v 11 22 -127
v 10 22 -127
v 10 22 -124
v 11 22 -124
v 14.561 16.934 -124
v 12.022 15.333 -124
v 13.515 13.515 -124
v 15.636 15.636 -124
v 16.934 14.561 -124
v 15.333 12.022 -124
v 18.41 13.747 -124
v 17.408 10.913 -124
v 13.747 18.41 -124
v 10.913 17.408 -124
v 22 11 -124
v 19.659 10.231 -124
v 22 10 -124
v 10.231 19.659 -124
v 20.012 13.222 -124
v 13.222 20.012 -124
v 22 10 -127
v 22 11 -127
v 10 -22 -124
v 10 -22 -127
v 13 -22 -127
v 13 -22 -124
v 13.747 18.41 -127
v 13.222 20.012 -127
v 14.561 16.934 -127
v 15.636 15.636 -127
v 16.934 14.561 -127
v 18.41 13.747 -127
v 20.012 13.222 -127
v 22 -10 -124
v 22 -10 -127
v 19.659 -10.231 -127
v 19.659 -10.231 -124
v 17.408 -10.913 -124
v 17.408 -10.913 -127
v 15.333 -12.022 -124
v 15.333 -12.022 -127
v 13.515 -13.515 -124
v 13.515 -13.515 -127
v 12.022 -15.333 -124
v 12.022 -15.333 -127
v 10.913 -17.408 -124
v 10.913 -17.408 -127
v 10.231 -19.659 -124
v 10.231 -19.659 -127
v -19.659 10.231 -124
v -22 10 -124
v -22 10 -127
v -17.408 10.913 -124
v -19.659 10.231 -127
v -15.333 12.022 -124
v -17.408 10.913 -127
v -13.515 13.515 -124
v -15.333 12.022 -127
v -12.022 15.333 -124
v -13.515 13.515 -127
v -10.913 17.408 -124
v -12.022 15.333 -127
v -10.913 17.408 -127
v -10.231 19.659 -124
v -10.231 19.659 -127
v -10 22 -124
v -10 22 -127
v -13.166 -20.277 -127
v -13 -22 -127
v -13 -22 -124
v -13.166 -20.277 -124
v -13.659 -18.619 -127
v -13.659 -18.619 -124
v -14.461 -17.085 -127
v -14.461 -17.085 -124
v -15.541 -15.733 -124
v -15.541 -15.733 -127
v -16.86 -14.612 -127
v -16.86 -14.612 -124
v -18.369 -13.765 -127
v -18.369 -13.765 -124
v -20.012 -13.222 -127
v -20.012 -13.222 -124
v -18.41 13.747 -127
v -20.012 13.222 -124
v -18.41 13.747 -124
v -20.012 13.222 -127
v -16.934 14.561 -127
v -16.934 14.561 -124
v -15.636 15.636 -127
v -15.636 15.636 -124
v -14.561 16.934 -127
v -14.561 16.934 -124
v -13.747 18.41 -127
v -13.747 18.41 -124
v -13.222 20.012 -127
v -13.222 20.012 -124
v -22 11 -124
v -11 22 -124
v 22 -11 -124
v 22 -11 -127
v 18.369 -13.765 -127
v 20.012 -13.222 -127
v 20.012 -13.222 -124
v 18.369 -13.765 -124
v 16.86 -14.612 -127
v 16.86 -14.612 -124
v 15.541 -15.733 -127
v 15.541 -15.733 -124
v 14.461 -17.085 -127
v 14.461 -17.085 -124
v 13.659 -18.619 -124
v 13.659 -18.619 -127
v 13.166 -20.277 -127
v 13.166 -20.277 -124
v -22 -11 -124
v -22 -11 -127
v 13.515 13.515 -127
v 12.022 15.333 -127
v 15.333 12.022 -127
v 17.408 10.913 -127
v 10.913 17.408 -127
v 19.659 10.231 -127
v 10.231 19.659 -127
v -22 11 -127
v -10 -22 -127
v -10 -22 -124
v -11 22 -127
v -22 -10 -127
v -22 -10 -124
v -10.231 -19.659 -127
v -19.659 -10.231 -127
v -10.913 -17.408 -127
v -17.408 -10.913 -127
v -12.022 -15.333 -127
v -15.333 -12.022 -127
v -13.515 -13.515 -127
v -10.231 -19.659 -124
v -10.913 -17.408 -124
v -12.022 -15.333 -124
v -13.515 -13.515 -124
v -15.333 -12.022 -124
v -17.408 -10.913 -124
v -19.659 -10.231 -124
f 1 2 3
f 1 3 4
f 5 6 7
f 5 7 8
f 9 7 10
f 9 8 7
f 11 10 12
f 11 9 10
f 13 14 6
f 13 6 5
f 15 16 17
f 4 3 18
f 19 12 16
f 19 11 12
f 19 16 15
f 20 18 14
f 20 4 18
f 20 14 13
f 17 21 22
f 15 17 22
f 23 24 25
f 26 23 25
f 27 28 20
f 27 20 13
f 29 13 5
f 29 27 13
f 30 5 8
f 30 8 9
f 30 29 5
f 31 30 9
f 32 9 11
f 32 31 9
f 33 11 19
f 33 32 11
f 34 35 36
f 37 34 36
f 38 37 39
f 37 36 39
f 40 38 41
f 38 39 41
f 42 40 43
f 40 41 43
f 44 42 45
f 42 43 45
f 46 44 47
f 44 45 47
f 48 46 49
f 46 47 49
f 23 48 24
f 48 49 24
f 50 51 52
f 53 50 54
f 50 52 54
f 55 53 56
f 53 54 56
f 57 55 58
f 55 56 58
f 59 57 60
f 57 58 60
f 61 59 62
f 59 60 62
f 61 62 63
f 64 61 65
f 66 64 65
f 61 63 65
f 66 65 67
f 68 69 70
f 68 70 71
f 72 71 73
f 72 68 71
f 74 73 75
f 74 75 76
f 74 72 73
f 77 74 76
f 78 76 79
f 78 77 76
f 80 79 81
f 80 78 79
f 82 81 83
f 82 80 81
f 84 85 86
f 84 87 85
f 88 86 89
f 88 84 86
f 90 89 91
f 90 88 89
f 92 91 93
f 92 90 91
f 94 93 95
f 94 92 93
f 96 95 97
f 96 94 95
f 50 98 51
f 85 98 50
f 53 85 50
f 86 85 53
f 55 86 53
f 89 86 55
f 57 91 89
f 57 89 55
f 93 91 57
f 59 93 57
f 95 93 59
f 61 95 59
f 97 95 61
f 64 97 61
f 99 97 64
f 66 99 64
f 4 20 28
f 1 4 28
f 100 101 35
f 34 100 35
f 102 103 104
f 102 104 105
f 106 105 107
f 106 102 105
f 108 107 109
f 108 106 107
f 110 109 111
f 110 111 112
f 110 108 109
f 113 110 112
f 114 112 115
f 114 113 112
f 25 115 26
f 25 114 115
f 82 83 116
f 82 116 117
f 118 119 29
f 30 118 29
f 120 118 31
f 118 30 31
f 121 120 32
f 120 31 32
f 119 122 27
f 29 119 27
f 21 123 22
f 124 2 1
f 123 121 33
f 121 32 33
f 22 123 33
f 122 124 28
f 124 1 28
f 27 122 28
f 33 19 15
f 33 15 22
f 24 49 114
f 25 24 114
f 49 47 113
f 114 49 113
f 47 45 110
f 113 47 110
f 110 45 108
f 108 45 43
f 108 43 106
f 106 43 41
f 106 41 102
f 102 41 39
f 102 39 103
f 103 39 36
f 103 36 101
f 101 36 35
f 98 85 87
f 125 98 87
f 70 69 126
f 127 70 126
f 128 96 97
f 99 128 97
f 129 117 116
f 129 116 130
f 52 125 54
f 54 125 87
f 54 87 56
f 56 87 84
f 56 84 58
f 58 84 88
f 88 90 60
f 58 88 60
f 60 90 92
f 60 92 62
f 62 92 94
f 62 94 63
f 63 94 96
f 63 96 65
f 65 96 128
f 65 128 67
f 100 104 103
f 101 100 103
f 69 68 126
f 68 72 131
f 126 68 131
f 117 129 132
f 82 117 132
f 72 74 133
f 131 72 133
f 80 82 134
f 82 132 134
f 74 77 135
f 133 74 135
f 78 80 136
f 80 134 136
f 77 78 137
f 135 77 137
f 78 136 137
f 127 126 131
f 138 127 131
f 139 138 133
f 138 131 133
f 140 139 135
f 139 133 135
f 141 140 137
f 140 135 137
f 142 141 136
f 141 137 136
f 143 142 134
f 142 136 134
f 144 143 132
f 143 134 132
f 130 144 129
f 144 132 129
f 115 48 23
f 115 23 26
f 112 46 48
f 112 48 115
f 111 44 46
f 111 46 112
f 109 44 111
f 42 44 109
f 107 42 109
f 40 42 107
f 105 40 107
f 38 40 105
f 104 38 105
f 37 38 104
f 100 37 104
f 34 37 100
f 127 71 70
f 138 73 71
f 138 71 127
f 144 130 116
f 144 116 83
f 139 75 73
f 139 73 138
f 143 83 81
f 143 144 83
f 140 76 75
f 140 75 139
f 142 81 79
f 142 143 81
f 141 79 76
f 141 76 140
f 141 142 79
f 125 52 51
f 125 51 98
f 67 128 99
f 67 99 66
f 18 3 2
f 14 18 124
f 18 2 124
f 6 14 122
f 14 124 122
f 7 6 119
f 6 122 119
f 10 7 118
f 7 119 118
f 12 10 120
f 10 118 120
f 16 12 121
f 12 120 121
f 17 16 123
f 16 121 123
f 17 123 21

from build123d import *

# Parameters (mm, degrees)
BOX733_W        = 44
BOX733_H        = 44
BOX733_DEPTH    = 50
TUBE072_R       = 12
TUBE072_R_2     = 9
TUBE072_DEPTH   = 3
TUBE071_R       = 12
TUBE071_R_2     = 9
TUBE071_DEPTH   = 3
TUBE073_R       = 12
TUBE073_R_2     = 9
TUBE073_DEPTH   = 3
TUBE070_R       = 12
TUBE070_R_2     = 9
TUBE070_DEPTH   = 3
CHAMFER008_SIZE = 2
CHAMFER010_SIZE = 2


with BuildPart() as krychle732:
    # Box733 → Box733 (new body)
    with BuildSketch(Plane(origin=(-22, -22, -126), x_dir=(1, 0, 0), z_dir=(0, 0, 1))):
        with Locations((22, 22)):
            Rectangle(BOX733_W, BOX733_H)
    extrude(amount=BOX733_DEPTH)


with BuildPart() as tube072:
    # Tube072 → Tube072 (new body)
    with BuildSketch(Plane(origin=(22, -22, -126), x_dir=(1, 0, 0), z_dir=(0, 0, 1))):
        Circle(TUBE072_R)
        Circle(TUBE072_R_2, mode=Mode.SUBTRACT)
    extrude(amount=TUBE072_DEPTH)


with BuildPart() as tube071:
    # Tube071 → Tube071 (new body)
    with BuildSketch(Plane(origin=(-22, 22, -126), x_dir=(1, 0, 0), z_dir=(0, 0, 1))):
        Circle(TUBE071_R)
        Circle(TUBE071_R_2, mode=Mode.SUBTRACT)
    extrude(amount=TUBE071_DEPTH)


with BuildPart() as tube073:
    # Tube073 → Tube073 (new body)
    with BuildSketch(Plane(origin=(22, 22, -126), x_dir=(1, 0, 0), z_dir=(0, 0, 1))):
        Circle(TUBE073_R)
        Circle(TUBE073_R_2, mode=Mode.SUBTRACT)
    extrude(amount=TUBE073_DEPTH)


with BuildPart() as chamfer010:
    # Tube070 → Tube070 (new body)
    with BuildSketch(Plane(origin=(-22, -22, -126), x_dir=(1, 0, 0), z_dir=(0, 0, 1))):
        Circle(TUBE070_R)
        Circle(TUBE070_R_2, mode=Mode.SUBTRACT)
    extrude(amount=TUBE070_DEPTH)

    # Compound839: union Tube072, Tube071, Tube073
    add(tube072.part)
    add(tube071.part)
    add(tube073.part)

    # Common015: intersect Krychle732
    add(krychle732.part, mode=Mode.INTERSECT)


with BuildPart() as chamfer010_1:
    # Common015 placement: moved
    add(chamfer010.part.moved(Location((0, 0, -1))))

    # Chamfer008
    chamfer008_edges = [chamfer010_1.edges().sort_by_distance(p)[0] for p in [
        (22, -13, -125.5),
        (22, 13, -125.5),
        (13, 22, -125.5),
    ]]
    chamfer(chamfer008_edges, length=CHAMFER008_SIZE)

    # Chamfer010
    chamfer010_edges = [chamfer010_1.edges().sort_by_distance(p)[0] for p in [
        (-22, -13, -125.5),
        (-13, 22, -125.5),
        (-22, 13, -125.5),
    ]]
    chamfer(chamfer010_edges, length=CHAMFER010_SIZE)


solid = chamfer010_1.part
